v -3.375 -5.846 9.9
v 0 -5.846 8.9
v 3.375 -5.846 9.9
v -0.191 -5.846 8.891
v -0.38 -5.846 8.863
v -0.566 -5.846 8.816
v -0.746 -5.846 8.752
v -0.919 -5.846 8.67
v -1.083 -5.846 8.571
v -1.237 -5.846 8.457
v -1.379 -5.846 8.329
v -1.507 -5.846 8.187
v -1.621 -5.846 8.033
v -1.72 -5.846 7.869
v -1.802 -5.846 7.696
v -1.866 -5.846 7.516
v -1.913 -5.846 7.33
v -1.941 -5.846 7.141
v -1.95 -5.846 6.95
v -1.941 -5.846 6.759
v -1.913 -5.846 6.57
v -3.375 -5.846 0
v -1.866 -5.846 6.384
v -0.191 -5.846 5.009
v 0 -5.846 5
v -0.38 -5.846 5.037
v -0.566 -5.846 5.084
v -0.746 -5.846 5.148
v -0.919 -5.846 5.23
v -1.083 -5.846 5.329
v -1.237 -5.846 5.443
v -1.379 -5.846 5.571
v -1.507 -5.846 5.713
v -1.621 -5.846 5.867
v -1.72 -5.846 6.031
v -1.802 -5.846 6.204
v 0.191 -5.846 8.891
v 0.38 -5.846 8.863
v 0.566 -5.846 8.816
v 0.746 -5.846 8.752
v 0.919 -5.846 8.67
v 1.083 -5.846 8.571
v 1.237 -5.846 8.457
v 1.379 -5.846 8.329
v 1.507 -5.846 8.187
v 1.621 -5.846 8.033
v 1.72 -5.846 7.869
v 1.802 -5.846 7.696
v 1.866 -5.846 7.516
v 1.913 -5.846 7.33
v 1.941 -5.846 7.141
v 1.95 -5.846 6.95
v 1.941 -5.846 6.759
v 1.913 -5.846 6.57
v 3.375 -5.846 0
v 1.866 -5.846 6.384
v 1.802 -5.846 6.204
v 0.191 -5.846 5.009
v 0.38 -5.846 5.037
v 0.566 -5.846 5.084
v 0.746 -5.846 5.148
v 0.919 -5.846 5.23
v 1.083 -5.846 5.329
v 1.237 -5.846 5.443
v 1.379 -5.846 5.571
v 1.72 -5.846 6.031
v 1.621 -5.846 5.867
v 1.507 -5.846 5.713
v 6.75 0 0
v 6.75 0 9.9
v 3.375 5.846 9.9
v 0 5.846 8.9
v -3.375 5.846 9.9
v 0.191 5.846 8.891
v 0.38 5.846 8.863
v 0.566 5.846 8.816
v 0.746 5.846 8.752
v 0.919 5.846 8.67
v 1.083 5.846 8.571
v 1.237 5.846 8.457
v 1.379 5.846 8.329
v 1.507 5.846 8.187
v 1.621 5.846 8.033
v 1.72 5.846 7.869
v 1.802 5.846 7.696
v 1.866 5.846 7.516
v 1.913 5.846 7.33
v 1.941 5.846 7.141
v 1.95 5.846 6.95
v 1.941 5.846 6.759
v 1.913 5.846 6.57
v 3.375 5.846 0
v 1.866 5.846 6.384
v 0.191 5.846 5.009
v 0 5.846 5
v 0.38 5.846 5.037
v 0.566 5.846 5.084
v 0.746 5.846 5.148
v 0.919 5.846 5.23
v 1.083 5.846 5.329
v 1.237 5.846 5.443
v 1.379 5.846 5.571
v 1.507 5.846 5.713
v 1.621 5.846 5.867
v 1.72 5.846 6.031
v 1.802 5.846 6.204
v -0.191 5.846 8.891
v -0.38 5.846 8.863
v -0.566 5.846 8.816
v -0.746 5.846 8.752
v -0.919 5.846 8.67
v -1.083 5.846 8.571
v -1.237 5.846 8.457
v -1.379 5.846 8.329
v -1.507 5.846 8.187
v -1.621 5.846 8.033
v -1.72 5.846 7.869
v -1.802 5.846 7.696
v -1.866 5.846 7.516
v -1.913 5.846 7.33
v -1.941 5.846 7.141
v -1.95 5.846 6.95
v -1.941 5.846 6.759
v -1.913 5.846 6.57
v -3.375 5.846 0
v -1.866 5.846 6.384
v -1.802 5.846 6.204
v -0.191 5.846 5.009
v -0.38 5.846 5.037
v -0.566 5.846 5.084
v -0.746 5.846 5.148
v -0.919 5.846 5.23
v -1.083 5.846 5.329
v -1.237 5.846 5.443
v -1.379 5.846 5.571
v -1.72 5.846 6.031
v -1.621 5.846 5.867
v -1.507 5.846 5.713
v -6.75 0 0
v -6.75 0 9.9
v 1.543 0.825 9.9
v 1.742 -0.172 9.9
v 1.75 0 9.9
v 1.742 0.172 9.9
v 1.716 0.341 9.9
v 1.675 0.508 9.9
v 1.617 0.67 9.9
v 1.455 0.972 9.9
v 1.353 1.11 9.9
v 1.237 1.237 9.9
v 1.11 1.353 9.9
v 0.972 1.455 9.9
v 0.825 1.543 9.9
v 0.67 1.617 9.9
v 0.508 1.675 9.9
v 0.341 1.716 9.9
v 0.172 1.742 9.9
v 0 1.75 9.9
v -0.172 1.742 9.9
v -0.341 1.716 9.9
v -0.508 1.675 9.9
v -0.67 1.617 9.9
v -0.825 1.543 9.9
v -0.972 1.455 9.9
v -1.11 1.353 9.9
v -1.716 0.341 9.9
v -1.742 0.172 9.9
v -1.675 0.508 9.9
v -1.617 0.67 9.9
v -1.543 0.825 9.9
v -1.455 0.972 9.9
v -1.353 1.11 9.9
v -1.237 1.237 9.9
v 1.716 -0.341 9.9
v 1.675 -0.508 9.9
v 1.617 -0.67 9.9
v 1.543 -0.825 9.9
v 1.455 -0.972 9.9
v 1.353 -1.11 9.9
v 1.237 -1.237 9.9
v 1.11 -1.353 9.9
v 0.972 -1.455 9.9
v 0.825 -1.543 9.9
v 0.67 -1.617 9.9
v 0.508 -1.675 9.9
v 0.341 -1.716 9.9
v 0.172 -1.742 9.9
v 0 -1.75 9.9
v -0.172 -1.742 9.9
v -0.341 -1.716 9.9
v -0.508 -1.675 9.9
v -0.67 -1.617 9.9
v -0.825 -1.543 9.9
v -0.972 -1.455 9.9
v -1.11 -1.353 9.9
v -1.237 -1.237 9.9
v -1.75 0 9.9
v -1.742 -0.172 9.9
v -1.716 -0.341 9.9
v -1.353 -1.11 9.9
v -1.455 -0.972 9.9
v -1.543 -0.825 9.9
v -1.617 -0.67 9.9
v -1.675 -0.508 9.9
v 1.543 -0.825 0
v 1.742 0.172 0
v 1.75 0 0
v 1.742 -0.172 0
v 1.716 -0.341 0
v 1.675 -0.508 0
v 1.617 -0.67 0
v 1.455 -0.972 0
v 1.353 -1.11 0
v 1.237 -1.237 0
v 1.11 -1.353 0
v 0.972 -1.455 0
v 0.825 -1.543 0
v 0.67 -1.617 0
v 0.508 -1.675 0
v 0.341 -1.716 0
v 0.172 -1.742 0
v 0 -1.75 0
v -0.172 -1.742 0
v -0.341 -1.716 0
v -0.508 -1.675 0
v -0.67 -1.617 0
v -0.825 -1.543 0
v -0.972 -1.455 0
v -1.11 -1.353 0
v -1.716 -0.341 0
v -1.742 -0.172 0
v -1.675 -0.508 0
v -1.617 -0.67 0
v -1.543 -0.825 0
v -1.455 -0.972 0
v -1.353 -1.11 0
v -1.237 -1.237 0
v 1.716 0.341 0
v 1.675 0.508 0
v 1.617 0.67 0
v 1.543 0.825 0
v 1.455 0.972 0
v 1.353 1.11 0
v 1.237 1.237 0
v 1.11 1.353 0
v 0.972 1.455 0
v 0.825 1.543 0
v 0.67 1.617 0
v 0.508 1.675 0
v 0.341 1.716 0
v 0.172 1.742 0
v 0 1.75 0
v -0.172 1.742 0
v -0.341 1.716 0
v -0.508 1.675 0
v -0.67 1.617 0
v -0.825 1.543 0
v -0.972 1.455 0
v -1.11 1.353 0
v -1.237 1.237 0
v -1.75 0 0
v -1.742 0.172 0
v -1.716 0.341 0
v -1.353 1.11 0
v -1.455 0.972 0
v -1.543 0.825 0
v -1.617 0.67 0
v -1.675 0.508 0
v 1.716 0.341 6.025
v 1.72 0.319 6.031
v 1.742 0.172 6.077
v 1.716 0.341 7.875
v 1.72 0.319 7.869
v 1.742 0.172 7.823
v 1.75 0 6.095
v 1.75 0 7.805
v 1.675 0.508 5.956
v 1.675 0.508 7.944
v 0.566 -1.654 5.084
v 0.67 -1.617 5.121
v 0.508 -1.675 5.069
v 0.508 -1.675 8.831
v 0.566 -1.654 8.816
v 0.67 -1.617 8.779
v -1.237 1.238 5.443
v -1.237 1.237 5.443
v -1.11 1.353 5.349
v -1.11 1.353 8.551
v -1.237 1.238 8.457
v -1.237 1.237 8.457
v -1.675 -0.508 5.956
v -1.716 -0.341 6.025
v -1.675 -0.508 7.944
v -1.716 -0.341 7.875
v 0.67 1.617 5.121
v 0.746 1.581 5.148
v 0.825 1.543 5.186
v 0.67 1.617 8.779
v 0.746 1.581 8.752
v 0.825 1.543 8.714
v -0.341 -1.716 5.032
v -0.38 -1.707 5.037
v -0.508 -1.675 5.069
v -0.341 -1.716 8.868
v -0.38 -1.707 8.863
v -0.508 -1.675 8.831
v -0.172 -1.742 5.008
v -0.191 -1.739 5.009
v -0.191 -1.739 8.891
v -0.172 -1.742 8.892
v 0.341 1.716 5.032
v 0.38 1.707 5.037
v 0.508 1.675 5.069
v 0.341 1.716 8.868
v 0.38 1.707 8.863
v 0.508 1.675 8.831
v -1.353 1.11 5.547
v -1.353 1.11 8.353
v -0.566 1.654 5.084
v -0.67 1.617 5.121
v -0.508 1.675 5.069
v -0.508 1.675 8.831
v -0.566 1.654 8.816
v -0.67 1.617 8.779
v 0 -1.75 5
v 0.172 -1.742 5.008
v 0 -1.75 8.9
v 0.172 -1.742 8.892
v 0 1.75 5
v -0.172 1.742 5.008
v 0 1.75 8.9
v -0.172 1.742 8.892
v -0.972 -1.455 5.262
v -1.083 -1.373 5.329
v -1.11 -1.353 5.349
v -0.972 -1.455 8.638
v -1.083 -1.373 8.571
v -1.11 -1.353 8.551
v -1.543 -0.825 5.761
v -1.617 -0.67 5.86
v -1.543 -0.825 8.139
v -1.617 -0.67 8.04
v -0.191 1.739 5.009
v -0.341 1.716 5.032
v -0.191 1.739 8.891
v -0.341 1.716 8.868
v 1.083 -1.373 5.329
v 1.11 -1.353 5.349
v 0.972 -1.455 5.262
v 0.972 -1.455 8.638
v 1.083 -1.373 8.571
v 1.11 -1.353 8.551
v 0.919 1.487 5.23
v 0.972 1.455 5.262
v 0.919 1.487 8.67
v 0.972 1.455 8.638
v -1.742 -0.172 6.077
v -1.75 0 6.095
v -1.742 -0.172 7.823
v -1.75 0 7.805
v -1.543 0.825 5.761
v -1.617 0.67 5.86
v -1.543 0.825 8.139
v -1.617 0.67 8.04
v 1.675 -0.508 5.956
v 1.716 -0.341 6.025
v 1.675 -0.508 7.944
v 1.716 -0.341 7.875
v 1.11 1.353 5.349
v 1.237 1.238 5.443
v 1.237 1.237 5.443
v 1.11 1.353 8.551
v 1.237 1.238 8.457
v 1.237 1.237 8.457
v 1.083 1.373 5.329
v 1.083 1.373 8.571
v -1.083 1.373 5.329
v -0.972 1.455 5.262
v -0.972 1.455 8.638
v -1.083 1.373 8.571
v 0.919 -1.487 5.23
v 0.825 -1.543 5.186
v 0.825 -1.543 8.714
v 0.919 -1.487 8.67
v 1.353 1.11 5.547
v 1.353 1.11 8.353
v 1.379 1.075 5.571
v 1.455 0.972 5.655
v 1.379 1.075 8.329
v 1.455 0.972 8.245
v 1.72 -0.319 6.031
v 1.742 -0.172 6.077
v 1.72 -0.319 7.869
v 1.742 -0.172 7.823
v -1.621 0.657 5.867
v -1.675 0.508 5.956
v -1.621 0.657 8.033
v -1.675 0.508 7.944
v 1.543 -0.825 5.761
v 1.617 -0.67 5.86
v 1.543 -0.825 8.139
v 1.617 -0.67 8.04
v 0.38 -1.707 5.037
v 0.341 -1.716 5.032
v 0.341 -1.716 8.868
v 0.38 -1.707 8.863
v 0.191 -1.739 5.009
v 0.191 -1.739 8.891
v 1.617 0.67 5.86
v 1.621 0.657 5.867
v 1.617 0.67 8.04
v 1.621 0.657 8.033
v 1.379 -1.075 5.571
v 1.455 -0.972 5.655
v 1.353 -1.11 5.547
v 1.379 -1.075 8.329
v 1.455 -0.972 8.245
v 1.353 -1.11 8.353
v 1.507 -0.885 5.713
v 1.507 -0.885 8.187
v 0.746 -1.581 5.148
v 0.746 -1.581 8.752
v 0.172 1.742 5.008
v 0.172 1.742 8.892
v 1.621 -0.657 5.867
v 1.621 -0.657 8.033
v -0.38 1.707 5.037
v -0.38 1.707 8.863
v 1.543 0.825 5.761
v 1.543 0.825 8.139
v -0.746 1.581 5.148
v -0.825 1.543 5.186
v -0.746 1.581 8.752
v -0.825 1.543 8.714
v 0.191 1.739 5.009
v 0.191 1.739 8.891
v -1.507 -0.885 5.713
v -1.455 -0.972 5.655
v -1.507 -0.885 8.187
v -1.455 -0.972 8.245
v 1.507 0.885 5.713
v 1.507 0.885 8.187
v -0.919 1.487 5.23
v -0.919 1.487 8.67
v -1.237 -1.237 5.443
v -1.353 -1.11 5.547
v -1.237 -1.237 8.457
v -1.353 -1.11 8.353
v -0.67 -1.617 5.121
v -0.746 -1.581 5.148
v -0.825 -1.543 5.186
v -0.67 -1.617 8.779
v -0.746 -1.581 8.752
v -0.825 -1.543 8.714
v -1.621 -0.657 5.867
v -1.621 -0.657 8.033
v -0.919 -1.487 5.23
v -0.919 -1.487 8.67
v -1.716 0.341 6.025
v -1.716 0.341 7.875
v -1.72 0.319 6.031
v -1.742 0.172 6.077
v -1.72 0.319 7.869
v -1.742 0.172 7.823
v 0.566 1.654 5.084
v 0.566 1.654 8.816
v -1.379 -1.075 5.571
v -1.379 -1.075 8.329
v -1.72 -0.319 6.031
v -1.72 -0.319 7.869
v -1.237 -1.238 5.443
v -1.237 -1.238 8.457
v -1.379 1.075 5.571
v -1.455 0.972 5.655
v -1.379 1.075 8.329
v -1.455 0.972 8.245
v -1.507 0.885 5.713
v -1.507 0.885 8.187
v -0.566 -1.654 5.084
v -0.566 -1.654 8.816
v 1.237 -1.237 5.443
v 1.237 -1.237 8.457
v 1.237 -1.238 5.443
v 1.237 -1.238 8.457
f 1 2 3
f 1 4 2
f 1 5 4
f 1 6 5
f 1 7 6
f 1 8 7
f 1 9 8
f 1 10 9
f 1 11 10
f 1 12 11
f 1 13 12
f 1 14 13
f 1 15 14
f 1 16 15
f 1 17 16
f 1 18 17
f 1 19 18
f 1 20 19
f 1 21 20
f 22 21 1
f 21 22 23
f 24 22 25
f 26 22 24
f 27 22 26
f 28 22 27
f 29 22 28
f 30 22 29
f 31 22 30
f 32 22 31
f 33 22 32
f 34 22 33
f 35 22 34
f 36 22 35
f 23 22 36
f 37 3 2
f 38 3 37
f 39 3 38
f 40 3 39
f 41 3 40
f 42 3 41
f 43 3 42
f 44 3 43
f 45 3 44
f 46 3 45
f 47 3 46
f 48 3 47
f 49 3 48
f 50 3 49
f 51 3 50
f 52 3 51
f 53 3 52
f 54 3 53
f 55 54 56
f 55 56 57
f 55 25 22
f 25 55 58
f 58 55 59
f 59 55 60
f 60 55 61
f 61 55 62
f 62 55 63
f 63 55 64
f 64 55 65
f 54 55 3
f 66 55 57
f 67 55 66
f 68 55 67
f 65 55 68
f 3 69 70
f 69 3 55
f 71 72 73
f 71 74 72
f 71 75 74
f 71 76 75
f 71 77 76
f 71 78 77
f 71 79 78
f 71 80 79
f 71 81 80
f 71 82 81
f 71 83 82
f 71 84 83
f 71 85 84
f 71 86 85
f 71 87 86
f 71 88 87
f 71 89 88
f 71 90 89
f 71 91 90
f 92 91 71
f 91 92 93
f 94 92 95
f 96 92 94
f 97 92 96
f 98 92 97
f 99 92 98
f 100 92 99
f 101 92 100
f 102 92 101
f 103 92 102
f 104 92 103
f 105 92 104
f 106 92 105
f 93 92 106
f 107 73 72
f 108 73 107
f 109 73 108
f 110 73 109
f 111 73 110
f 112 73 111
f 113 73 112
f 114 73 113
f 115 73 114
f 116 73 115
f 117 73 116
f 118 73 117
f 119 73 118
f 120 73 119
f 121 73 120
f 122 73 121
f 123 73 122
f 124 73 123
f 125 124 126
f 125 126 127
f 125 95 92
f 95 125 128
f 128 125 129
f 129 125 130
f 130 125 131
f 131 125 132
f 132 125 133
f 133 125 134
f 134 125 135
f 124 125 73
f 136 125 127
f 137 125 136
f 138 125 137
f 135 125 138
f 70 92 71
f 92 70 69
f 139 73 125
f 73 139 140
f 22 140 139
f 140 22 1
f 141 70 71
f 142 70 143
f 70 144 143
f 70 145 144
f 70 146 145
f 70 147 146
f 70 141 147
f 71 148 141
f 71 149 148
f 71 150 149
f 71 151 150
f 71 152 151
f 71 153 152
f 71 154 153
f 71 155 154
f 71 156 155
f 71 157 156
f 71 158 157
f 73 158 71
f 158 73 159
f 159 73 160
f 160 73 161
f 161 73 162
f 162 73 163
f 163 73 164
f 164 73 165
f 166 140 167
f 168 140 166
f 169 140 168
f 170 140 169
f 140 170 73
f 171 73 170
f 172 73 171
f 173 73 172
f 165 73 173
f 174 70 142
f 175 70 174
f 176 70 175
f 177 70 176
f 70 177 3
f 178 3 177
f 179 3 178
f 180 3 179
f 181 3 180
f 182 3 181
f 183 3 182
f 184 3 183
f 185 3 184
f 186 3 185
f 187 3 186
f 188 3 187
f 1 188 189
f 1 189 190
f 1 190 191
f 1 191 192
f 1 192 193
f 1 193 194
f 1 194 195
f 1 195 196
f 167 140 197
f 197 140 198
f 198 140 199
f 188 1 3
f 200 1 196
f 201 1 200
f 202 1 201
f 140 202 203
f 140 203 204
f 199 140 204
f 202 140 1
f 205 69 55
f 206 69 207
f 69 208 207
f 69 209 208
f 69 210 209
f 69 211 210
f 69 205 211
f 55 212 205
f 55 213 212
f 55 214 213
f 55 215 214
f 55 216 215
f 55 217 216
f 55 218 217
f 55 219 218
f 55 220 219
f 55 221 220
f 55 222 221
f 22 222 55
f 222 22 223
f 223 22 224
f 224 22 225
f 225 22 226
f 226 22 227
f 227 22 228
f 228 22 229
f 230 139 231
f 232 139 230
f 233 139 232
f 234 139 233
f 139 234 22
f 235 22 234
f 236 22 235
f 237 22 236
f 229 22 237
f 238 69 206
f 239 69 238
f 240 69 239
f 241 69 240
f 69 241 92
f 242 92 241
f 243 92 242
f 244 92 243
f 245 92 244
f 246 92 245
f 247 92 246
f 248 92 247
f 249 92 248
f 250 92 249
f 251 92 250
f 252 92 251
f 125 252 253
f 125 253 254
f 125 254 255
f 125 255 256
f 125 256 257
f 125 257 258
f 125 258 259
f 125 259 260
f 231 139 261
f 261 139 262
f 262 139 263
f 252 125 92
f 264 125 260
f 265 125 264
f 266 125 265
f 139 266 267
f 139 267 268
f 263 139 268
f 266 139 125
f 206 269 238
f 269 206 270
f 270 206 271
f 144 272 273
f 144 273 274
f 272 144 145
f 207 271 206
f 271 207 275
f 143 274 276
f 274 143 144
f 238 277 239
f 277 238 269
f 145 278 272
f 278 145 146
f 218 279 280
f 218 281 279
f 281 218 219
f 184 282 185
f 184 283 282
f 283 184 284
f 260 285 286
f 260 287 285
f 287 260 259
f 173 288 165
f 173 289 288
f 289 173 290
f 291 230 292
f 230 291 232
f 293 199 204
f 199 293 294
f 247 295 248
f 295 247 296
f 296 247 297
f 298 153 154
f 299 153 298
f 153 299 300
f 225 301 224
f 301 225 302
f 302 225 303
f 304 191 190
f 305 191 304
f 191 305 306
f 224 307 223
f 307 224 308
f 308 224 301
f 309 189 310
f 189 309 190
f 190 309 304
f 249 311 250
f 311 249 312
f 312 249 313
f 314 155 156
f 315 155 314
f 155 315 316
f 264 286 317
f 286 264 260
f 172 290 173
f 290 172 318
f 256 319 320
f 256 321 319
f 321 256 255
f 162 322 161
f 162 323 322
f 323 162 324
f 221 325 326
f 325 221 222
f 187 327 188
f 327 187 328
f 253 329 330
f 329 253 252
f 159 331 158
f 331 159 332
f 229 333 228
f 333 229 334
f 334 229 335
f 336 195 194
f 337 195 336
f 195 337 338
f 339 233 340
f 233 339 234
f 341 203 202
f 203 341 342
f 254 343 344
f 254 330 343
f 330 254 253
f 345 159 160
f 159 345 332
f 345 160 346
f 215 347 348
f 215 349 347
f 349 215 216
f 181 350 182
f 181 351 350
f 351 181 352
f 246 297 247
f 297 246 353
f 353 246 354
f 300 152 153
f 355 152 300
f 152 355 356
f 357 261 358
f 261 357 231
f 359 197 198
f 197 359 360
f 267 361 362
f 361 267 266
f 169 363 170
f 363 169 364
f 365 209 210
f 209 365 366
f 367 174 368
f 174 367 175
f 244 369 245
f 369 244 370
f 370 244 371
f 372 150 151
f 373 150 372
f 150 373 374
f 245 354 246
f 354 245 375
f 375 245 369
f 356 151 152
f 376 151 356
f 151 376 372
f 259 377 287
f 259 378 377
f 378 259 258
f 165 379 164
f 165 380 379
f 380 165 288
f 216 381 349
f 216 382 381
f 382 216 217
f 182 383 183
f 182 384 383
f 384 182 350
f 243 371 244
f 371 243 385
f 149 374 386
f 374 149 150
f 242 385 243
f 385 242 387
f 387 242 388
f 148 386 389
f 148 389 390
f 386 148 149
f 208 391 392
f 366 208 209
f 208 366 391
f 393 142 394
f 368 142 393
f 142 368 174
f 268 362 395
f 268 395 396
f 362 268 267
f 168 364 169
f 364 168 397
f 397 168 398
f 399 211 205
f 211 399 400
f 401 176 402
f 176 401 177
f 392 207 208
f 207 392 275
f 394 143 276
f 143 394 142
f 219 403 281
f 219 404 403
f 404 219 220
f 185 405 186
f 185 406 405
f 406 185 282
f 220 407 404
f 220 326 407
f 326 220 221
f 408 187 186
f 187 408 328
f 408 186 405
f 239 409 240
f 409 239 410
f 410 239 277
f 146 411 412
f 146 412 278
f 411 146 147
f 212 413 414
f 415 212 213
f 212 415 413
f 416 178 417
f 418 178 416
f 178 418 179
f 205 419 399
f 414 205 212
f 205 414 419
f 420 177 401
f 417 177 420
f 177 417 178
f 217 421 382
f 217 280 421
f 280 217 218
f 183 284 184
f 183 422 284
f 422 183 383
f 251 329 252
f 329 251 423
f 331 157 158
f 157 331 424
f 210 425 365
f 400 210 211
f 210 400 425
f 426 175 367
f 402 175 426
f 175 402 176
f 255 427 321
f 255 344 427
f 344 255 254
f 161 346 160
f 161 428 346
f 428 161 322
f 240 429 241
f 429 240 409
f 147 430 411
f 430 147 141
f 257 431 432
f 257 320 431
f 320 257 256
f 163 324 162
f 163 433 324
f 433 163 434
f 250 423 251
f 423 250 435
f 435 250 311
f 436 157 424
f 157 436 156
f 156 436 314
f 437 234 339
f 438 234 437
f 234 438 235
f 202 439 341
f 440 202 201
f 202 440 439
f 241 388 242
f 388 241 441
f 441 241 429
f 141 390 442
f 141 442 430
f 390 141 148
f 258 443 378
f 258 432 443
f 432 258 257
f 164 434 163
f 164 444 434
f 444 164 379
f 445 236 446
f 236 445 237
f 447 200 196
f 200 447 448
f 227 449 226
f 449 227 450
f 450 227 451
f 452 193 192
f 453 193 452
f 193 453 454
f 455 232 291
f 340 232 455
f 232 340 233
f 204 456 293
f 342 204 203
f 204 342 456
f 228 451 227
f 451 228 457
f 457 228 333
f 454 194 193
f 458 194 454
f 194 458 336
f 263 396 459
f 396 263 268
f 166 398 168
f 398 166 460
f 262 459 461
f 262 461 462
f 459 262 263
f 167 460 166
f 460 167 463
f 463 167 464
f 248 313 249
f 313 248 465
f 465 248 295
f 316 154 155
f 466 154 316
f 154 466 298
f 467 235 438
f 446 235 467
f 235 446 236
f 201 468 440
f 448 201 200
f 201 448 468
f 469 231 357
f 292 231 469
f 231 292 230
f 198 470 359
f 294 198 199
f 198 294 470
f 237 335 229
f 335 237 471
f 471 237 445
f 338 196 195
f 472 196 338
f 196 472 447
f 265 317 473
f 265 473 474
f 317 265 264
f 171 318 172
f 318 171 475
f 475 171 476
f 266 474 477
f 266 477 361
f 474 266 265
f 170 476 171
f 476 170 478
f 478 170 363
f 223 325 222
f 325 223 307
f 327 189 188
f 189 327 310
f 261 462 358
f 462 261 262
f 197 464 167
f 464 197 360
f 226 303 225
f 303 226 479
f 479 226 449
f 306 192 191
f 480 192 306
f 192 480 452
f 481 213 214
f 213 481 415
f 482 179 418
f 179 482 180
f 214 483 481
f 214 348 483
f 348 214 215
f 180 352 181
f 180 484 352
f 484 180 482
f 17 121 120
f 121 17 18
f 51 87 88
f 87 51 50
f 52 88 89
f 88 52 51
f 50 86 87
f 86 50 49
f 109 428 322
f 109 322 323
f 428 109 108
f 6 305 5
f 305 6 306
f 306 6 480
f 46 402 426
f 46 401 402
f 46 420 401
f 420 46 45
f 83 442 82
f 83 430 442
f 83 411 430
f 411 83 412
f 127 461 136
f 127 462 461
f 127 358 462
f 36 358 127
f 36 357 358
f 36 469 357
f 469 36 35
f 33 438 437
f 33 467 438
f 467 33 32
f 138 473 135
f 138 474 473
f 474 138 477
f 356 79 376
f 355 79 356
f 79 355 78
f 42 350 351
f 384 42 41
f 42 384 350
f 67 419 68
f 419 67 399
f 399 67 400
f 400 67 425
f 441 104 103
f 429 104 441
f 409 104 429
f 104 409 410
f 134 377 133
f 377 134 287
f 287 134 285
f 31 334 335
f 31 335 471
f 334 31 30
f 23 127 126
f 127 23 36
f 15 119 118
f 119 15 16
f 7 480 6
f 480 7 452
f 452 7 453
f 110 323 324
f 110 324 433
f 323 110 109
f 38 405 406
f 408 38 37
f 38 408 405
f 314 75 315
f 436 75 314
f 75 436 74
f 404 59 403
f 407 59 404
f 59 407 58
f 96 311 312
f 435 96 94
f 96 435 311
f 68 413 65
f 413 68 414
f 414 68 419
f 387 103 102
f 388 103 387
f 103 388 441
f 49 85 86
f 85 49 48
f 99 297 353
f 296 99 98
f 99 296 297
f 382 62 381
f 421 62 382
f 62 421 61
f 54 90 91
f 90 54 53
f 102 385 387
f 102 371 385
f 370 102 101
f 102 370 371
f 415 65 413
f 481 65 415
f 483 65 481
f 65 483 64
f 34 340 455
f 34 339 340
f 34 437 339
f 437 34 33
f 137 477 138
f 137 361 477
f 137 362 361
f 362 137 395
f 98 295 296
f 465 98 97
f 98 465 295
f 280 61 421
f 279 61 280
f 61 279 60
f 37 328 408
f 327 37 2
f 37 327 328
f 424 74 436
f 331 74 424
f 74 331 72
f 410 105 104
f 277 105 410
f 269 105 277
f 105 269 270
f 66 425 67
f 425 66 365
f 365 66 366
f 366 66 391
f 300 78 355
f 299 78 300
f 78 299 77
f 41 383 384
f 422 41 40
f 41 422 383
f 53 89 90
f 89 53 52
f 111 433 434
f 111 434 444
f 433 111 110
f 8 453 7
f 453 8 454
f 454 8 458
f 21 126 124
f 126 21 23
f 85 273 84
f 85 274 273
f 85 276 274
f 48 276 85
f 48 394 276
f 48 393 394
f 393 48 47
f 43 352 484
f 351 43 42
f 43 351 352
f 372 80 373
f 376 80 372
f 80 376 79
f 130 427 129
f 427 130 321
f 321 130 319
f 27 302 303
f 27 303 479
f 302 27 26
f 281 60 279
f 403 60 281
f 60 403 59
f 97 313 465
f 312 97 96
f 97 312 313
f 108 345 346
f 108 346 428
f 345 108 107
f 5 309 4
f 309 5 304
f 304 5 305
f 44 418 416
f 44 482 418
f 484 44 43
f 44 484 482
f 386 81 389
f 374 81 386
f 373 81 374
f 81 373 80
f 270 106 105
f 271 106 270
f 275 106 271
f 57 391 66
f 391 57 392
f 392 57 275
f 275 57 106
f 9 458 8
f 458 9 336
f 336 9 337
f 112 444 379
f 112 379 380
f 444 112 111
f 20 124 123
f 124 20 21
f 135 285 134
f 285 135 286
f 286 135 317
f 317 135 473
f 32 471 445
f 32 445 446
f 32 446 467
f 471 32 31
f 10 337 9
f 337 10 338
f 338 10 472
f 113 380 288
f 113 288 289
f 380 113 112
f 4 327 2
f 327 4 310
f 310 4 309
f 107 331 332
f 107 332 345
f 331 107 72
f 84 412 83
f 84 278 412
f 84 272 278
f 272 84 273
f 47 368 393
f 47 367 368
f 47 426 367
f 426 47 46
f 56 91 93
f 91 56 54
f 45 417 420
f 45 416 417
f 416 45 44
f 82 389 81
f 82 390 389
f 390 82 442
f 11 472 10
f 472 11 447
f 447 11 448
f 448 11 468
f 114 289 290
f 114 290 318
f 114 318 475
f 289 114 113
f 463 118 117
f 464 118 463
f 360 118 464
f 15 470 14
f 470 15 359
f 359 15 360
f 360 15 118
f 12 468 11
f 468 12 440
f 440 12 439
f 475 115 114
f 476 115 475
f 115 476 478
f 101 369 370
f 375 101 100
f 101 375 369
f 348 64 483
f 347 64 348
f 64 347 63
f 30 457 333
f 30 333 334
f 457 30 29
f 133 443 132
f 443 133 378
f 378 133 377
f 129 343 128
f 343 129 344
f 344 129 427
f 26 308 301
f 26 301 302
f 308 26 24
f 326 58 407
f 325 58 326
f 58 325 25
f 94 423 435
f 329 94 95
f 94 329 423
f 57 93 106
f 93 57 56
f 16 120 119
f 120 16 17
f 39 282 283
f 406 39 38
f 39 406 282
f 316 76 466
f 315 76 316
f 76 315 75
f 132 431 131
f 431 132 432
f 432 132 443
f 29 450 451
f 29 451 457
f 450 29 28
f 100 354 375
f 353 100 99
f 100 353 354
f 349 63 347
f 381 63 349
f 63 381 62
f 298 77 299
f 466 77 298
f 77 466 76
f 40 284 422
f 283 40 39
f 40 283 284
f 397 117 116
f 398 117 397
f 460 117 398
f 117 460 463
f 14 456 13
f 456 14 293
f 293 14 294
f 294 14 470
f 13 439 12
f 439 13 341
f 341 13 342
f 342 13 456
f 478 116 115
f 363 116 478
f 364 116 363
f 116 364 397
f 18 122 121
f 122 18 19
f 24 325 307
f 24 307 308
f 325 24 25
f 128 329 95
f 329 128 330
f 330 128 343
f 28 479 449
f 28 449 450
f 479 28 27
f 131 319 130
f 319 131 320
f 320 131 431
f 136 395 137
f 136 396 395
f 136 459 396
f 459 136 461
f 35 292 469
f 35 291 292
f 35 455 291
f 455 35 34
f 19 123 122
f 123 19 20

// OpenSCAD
// Solenoid-screw connector
$fn = 64;


screw_dia = 3.5;
solenoid_screw_dia = 3.9;
wall_thick = 5.0;
connector_h = solenoid_screw_dia+2*wall_thick;
extra = 0.8;

module connector() {
    difference() {
        cylinder(d=screw_dia+2*wall_thick, h=connector_h-4, $fn=6);
        cylinder(d=screw_dia, h=connector_h);
        translate([0,0,connector_h/2])
        rotate([90,0,0])
        translate([0,0,-screw_dia/2-wall_thick])
        cylinder(h=screw_dia+wall_thick*2, d=solenoid_screw_dia);
        //cube(1000);
    }
}
connector();

washer_h = 2.2;
hole_d = 4.6;
washer_len = 6.8;
washer_wid = 6.2;

module washer() {
    linear_extrude(washer_h)
    difference() {
        square([washer_len, washer_wid], center=true);
        circle(d=hole_d);
    }
}
